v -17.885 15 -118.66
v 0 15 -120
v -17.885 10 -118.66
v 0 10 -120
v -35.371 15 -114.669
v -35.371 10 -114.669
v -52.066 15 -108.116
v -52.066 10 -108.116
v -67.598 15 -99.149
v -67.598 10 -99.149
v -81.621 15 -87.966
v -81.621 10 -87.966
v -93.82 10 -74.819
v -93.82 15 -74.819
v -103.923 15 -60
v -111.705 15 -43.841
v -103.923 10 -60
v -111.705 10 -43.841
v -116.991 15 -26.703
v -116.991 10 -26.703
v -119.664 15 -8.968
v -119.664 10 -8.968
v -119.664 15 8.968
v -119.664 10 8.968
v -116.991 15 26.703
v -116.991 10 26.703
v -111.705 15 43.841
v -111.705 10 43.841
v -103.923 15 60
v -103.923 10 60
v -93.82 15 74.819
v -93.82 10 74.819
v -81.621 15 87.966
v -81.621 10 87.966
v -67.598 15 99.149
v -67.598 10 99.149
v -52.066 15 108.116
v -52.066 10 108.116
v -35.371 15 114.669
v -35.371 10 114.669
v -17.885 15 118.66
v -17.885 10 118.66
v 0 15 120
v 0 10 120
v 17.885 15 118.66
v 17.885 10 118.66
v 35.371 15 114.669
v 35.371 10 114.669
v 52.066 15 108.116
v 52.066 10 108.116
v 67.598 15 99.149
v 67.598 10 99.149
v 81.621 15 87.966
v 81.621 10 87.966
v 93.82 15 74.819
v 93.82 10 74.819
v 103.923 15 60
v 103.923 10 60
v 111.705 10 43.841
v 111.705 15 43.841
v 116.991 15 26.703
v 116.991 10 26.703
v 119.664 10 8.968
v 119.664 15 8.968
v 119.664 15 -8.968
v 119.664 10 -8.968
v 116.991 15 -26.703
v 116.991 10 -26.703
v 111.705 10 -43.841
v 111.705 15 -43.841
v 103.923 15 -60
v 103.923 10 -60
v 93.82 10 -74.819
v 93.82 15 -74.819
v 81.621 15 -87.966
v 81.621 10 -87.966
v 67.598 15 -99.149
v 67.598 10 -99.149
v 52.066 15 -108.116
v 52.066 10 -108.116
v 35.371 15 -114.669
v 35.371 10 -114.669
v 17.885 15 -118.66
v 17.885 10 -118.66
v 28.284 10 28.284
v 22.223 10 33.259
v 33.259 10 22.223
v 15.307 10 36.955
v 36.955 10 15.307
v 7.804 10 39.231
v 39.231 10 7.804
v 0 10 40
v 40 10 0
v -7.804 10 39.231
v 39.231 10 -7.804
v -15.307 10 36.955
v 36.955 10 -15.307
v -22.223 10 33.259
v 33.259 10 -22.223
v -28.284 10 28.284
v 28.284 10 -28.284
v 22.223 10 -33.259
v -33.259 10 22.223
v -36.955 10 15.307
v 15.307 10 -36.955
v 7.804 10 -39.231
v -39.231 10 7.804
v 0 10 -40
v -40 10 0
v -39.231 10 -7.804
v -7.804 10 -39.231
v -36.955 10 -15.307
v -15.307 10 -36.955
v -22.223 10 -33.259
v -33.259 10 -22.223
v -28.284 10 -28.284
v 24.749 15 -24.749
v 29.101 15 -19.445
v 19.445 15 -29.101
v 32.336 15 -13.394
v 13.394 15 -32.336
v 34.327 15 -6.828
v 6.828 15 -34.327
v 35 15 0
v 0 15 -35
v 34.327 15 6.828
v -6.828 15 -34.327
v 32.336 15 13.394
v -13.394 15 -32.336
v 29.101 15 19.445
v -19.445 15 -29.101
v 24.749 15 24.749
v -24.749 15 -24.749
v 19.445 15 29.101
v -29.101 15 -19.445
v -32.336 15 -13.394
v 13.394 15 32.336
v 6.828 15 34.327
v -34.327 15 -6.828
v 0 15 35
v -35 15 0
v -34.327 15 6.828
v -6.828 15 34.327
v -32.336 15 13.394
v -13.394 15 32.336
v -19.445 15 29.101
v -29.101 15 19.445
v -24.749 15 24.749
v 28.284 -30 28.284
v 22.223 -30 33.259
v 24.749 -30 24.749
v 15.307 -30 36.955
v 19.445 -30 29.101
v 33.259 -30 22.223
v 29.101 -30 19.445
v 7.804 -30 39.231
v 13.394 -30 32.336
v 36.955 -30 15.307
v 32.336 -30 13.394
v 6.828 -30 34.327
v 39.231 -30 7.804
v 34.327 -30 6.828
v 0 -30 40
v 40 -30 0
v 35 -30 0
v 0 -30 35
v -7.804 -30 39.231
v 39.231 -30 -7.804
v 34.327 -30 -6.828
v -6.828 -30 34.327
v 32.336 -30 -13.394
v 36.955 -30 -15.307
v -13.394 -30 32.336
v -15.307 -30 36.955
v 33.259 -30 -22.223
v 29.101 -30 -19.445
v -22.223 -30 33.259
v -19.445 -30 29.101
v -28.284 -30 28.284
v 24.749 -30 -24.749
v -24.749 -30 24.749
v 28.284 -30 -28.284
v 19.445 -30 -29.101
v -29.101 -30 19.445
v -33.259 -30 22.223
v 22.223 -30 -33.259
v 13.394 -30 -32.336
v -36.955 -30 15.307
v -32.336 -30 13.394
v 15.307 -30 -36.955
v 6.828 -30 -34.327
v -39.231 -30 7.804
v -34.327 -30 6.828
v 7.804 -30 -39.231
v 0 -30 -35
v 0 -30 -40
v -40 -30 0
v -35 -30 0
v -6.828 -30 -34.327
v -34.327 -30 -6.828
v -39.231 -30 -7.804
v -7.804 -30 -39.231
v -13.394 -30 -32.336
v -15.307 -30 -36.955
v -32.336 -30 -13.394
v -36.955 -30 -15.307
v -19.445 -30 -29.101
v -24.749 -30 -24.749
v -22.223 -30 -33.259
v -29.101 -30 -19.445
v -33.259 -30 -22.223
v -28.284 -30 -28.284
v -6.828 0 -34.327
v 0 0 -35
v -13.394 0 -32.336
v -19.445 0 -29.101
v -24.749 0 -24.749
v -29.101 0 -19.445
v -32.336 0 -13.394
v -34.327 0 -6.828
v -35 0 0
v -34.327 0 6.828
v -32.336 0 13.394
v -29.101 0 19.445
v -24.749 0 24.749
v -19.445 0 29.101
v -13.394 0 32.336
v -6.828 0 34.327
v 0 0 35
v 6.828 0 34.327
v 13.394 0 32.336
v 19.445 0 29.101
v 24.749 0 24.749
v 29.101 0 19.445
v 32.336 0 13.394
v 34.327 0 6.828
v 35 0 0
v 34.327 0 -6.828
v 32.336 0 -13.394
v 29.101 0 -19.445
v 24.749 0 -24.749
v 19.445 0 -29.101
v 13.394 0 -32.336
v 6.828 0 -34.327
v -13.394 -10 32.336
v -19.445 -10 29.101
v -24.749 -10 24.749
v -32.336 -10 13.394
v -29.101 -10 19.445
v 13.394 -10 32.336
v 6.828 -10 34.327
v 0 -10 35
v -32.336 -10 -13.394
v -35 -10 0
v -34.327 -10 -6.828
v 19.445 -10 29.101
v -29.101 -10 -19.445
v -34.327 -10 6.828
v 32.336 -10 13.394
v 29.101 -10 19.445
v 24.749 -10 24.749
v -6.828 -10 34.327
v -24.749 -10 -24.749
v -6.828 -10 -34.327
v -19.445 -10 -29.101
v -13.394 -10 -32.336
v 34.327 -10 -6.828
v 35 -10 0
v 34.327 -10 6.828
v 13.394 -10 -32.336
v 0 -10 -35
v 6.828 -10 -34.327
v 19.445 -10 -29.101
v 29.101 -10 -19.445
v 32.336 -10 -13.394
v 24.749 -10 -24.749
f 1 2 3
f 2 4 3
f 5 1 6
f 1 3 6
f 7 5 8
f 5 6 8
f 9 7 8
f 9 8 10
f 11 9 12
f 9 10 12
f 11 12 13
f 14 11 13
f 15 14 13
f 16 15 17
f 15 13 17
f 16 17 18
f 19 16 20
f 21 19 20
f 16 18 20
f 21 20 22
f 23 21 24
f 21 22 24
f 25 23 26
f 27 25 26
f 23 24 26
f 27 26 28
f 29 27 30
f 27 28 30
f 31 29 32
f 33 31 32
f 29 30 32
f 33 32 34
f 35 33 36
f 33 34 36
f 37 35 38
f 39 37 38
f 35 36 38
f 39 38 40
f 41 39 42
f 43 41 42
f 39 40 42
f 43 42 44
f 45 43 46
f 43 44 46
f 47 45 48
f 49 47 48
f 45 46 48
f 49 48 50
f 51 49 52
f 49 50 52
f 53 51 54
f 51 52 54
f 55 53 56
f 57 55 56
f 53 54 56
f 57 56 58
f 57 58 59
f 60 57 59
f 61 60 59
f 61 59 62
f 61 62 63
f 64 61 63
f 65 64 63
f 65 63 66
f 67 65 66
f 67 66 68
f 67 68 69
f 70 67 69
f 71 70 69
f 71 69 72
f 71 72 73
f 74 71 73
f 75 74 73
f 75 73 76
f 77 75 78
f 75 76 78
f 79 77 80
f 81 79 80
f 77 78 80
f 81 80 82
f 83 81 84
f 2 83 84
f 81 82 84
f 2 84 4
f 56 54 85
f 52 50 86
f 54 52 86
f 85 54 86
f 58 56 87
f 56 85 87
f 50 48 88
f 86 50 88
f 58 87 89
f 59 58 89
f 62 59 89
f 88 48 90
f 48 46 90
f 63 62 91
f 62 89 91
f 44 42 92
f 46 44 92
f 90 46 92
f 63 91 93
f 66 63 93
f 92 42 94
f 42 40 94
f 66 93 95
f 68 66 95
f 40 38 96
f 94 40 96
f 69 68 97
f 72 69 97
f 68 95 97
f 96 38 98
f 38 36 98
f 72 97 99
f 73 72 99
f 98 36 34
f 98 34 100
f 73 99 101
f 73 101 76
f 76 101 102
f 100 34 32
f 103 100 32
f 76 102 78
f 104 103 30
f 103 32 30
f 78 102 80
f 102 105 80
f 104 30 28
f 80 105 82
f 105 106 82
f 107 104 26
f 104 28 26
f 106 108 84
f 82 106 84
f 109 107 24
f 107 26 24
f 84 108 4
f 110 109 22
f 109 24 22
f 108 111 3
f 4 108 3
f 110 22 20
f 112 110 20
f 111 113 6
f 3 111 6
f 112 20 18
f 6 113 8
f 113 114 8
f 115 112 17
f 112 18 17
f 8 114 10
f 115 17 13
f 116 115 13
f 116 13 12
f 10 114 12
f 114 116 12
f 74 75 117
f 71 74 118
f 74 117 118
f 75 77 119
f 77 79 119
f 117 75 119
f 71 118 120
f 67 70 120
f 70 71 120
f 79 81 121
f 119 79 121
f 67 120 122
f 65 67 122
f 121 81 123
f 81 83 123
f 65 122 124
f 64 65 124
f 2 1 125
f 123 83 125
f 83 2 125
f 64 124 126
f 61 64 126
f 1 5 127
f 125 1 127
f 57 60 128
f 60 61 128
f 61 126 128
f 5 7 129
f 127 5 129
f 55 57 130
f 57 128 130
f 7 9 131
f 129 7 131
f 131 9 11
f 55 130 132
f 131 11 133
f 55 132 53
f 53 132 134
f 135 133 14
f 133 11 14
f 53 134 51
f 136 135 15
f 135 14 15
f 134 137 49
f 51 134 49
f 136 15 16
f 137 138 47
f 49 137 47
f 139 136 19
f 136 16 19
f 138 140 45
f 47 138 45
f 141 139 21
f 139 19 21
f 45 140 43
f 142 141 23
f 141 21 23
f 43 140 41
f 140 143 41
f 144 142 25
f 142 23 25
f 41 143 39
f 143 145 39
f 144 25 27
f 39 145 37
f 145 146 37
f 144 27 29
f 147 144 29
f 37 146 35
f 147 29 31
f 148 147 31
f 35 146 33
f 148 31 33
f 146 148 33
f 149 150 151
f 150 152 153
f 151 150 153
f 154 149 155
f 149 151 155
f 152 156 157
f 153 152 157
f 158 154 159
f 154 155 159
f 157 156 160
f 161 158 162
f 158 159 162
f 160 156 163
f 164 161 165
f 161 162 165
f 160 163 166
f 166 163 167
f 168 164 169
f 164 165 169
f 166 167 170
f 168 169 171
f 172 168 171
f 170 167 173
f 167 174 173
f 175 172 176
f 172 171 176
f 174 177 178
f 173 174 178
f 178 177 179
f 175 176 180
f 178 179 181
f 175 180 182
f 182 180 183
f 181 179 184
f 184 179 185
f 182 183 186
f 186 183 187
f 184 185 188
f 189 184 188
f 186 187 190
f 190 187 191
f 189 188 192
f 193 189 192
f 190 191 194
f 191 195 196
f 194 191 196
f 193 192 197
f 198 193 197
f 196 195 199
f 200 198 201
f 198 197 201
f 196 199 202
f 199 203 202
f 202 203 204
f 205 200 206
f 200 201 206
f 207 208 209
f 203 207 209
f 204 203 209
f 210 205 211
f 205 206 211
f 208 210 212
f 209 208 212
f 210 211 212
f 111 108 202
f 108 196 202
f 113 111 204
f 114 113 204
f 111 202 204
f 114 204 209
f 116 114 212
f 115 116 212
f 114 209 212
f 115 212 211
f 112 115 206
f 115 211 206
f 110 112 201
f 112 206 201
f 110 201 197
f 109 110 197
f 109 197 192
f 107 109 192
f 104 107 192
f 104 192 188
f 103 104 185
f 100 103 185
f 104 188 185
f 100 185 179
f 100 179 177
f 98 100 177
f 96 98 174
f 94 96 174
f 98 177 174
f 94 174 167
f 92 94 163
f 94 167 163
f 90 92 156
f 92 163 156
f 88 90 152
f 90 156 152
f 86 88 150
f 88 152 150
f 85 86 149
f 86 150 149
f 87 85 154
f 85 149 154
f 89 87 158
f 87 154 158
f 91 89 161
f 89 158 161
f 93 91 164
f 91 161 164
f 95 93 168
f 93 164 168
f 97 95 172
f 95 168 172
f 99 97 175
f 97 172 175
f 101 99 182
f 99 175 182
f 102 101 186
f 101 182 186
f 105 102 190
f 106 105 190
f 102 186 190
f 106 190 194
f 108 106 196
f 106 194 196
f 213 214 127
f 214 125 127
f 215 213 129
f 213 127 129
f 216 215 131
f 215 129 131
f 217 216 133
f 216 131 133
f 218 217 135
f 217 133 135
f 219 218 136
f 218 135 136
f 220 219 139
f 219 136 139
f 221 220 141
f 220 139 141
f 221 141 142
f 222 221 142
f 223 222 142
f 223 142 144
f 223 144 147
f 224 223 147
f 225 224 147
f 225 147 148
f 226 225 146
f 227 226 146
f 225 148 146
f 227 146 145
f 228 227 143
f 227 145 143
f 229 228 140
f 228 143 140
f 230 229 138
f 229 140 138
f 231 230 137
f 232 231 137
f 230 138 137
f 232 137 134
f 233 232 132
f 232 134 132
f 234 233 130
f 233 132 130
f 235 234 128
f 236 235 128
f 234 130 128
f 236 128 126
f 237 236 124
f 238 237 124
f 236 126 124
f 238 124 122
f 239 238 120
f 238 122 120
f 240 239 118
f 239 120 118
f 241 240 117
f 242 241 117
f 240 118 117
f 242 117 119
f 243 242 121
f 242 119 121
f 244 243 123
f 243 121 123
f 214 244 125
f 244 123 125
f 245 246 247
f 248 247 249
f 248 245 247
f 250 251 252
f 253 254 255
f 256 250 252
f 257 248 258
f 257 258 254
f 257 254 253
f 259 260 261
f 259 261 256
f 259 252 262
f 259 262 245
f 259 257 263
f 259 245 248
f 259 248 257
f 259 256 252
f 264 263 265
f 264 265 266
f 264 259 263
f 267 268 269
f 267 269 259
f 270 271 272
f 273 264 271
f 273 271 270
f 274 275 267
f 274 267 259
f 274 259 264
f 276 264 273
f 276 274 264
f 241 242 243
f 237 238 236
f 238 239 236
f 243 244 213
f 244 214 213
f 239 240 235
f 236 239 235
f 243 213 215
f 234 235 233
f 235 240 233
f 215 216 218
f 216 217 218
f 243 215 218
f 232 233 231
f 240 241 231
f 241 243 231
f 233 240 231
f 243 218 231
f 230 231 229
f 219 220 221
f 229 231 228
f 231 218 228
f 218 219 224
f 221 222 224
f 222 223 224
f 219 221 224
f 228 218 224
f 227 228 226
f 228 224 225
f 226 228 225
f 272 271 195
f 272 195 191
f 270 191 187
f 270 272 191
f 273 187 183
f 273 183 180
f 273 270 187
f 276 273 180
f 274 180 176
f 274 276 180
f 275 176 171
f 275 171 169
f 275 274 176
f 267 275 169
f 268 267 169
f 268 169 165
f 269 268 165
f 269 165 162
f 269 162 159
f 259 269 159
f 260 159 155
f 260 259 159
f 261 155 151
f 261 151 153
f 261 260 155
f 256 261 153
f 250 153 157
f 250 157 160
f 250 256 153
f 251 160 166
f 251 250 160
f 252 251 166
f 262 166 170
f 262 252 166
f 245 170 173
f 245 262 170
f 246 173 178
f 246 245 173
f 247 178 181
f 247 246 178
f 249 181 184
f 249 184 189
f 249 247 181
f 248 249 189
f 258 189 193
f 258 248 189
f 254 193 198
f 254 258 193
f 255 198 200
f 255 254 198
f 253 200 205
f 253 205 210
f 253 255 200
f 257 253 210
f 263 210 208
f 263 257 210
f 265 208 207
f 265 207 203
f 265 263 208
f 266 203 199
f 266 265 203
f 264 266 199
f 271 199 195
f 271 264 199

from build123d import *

# Parameters (mm, degrees)
CUT_EXTRUDE_START   = -20
SKETCH_2_R          = 35
CUT_EXTRUDE_1_DEPTH = 20


with BuildPart() as part:
    # Эскиз1 → Повернуть1 (revolve)
    with BuildSketch(Plane.XY, mode=Mode.PRIVATE) as revolve_1_sk:
        Polygon((0, 0), (-35, 0), (-35, 15), (-120, 15), (-120, 10), (-40, 10), (-40, -30), (0, -30), align=None)
    revolve(revolve_1_sk.sketch.rotate(Axis((0, -30, 0), (0, 1, 0)), 270), axis=Axis((0, -30, 0), (0, 1, 0)))

    # Эскиз2 → Вырез-Вытянуть1 (cut)
    with BuildSketch(Plane.XZ.offset(30).offset(CUT_EXTRUDE_START)):
        with Locations(Location((0, 0, 0), (0, 0, 270))):
            Circle(SKETCH_2_R)
    extrude(amount=CUT_EXTRUDE_1_DEPTH, mode=Mode.SUBTRACT)


solid = part.part
